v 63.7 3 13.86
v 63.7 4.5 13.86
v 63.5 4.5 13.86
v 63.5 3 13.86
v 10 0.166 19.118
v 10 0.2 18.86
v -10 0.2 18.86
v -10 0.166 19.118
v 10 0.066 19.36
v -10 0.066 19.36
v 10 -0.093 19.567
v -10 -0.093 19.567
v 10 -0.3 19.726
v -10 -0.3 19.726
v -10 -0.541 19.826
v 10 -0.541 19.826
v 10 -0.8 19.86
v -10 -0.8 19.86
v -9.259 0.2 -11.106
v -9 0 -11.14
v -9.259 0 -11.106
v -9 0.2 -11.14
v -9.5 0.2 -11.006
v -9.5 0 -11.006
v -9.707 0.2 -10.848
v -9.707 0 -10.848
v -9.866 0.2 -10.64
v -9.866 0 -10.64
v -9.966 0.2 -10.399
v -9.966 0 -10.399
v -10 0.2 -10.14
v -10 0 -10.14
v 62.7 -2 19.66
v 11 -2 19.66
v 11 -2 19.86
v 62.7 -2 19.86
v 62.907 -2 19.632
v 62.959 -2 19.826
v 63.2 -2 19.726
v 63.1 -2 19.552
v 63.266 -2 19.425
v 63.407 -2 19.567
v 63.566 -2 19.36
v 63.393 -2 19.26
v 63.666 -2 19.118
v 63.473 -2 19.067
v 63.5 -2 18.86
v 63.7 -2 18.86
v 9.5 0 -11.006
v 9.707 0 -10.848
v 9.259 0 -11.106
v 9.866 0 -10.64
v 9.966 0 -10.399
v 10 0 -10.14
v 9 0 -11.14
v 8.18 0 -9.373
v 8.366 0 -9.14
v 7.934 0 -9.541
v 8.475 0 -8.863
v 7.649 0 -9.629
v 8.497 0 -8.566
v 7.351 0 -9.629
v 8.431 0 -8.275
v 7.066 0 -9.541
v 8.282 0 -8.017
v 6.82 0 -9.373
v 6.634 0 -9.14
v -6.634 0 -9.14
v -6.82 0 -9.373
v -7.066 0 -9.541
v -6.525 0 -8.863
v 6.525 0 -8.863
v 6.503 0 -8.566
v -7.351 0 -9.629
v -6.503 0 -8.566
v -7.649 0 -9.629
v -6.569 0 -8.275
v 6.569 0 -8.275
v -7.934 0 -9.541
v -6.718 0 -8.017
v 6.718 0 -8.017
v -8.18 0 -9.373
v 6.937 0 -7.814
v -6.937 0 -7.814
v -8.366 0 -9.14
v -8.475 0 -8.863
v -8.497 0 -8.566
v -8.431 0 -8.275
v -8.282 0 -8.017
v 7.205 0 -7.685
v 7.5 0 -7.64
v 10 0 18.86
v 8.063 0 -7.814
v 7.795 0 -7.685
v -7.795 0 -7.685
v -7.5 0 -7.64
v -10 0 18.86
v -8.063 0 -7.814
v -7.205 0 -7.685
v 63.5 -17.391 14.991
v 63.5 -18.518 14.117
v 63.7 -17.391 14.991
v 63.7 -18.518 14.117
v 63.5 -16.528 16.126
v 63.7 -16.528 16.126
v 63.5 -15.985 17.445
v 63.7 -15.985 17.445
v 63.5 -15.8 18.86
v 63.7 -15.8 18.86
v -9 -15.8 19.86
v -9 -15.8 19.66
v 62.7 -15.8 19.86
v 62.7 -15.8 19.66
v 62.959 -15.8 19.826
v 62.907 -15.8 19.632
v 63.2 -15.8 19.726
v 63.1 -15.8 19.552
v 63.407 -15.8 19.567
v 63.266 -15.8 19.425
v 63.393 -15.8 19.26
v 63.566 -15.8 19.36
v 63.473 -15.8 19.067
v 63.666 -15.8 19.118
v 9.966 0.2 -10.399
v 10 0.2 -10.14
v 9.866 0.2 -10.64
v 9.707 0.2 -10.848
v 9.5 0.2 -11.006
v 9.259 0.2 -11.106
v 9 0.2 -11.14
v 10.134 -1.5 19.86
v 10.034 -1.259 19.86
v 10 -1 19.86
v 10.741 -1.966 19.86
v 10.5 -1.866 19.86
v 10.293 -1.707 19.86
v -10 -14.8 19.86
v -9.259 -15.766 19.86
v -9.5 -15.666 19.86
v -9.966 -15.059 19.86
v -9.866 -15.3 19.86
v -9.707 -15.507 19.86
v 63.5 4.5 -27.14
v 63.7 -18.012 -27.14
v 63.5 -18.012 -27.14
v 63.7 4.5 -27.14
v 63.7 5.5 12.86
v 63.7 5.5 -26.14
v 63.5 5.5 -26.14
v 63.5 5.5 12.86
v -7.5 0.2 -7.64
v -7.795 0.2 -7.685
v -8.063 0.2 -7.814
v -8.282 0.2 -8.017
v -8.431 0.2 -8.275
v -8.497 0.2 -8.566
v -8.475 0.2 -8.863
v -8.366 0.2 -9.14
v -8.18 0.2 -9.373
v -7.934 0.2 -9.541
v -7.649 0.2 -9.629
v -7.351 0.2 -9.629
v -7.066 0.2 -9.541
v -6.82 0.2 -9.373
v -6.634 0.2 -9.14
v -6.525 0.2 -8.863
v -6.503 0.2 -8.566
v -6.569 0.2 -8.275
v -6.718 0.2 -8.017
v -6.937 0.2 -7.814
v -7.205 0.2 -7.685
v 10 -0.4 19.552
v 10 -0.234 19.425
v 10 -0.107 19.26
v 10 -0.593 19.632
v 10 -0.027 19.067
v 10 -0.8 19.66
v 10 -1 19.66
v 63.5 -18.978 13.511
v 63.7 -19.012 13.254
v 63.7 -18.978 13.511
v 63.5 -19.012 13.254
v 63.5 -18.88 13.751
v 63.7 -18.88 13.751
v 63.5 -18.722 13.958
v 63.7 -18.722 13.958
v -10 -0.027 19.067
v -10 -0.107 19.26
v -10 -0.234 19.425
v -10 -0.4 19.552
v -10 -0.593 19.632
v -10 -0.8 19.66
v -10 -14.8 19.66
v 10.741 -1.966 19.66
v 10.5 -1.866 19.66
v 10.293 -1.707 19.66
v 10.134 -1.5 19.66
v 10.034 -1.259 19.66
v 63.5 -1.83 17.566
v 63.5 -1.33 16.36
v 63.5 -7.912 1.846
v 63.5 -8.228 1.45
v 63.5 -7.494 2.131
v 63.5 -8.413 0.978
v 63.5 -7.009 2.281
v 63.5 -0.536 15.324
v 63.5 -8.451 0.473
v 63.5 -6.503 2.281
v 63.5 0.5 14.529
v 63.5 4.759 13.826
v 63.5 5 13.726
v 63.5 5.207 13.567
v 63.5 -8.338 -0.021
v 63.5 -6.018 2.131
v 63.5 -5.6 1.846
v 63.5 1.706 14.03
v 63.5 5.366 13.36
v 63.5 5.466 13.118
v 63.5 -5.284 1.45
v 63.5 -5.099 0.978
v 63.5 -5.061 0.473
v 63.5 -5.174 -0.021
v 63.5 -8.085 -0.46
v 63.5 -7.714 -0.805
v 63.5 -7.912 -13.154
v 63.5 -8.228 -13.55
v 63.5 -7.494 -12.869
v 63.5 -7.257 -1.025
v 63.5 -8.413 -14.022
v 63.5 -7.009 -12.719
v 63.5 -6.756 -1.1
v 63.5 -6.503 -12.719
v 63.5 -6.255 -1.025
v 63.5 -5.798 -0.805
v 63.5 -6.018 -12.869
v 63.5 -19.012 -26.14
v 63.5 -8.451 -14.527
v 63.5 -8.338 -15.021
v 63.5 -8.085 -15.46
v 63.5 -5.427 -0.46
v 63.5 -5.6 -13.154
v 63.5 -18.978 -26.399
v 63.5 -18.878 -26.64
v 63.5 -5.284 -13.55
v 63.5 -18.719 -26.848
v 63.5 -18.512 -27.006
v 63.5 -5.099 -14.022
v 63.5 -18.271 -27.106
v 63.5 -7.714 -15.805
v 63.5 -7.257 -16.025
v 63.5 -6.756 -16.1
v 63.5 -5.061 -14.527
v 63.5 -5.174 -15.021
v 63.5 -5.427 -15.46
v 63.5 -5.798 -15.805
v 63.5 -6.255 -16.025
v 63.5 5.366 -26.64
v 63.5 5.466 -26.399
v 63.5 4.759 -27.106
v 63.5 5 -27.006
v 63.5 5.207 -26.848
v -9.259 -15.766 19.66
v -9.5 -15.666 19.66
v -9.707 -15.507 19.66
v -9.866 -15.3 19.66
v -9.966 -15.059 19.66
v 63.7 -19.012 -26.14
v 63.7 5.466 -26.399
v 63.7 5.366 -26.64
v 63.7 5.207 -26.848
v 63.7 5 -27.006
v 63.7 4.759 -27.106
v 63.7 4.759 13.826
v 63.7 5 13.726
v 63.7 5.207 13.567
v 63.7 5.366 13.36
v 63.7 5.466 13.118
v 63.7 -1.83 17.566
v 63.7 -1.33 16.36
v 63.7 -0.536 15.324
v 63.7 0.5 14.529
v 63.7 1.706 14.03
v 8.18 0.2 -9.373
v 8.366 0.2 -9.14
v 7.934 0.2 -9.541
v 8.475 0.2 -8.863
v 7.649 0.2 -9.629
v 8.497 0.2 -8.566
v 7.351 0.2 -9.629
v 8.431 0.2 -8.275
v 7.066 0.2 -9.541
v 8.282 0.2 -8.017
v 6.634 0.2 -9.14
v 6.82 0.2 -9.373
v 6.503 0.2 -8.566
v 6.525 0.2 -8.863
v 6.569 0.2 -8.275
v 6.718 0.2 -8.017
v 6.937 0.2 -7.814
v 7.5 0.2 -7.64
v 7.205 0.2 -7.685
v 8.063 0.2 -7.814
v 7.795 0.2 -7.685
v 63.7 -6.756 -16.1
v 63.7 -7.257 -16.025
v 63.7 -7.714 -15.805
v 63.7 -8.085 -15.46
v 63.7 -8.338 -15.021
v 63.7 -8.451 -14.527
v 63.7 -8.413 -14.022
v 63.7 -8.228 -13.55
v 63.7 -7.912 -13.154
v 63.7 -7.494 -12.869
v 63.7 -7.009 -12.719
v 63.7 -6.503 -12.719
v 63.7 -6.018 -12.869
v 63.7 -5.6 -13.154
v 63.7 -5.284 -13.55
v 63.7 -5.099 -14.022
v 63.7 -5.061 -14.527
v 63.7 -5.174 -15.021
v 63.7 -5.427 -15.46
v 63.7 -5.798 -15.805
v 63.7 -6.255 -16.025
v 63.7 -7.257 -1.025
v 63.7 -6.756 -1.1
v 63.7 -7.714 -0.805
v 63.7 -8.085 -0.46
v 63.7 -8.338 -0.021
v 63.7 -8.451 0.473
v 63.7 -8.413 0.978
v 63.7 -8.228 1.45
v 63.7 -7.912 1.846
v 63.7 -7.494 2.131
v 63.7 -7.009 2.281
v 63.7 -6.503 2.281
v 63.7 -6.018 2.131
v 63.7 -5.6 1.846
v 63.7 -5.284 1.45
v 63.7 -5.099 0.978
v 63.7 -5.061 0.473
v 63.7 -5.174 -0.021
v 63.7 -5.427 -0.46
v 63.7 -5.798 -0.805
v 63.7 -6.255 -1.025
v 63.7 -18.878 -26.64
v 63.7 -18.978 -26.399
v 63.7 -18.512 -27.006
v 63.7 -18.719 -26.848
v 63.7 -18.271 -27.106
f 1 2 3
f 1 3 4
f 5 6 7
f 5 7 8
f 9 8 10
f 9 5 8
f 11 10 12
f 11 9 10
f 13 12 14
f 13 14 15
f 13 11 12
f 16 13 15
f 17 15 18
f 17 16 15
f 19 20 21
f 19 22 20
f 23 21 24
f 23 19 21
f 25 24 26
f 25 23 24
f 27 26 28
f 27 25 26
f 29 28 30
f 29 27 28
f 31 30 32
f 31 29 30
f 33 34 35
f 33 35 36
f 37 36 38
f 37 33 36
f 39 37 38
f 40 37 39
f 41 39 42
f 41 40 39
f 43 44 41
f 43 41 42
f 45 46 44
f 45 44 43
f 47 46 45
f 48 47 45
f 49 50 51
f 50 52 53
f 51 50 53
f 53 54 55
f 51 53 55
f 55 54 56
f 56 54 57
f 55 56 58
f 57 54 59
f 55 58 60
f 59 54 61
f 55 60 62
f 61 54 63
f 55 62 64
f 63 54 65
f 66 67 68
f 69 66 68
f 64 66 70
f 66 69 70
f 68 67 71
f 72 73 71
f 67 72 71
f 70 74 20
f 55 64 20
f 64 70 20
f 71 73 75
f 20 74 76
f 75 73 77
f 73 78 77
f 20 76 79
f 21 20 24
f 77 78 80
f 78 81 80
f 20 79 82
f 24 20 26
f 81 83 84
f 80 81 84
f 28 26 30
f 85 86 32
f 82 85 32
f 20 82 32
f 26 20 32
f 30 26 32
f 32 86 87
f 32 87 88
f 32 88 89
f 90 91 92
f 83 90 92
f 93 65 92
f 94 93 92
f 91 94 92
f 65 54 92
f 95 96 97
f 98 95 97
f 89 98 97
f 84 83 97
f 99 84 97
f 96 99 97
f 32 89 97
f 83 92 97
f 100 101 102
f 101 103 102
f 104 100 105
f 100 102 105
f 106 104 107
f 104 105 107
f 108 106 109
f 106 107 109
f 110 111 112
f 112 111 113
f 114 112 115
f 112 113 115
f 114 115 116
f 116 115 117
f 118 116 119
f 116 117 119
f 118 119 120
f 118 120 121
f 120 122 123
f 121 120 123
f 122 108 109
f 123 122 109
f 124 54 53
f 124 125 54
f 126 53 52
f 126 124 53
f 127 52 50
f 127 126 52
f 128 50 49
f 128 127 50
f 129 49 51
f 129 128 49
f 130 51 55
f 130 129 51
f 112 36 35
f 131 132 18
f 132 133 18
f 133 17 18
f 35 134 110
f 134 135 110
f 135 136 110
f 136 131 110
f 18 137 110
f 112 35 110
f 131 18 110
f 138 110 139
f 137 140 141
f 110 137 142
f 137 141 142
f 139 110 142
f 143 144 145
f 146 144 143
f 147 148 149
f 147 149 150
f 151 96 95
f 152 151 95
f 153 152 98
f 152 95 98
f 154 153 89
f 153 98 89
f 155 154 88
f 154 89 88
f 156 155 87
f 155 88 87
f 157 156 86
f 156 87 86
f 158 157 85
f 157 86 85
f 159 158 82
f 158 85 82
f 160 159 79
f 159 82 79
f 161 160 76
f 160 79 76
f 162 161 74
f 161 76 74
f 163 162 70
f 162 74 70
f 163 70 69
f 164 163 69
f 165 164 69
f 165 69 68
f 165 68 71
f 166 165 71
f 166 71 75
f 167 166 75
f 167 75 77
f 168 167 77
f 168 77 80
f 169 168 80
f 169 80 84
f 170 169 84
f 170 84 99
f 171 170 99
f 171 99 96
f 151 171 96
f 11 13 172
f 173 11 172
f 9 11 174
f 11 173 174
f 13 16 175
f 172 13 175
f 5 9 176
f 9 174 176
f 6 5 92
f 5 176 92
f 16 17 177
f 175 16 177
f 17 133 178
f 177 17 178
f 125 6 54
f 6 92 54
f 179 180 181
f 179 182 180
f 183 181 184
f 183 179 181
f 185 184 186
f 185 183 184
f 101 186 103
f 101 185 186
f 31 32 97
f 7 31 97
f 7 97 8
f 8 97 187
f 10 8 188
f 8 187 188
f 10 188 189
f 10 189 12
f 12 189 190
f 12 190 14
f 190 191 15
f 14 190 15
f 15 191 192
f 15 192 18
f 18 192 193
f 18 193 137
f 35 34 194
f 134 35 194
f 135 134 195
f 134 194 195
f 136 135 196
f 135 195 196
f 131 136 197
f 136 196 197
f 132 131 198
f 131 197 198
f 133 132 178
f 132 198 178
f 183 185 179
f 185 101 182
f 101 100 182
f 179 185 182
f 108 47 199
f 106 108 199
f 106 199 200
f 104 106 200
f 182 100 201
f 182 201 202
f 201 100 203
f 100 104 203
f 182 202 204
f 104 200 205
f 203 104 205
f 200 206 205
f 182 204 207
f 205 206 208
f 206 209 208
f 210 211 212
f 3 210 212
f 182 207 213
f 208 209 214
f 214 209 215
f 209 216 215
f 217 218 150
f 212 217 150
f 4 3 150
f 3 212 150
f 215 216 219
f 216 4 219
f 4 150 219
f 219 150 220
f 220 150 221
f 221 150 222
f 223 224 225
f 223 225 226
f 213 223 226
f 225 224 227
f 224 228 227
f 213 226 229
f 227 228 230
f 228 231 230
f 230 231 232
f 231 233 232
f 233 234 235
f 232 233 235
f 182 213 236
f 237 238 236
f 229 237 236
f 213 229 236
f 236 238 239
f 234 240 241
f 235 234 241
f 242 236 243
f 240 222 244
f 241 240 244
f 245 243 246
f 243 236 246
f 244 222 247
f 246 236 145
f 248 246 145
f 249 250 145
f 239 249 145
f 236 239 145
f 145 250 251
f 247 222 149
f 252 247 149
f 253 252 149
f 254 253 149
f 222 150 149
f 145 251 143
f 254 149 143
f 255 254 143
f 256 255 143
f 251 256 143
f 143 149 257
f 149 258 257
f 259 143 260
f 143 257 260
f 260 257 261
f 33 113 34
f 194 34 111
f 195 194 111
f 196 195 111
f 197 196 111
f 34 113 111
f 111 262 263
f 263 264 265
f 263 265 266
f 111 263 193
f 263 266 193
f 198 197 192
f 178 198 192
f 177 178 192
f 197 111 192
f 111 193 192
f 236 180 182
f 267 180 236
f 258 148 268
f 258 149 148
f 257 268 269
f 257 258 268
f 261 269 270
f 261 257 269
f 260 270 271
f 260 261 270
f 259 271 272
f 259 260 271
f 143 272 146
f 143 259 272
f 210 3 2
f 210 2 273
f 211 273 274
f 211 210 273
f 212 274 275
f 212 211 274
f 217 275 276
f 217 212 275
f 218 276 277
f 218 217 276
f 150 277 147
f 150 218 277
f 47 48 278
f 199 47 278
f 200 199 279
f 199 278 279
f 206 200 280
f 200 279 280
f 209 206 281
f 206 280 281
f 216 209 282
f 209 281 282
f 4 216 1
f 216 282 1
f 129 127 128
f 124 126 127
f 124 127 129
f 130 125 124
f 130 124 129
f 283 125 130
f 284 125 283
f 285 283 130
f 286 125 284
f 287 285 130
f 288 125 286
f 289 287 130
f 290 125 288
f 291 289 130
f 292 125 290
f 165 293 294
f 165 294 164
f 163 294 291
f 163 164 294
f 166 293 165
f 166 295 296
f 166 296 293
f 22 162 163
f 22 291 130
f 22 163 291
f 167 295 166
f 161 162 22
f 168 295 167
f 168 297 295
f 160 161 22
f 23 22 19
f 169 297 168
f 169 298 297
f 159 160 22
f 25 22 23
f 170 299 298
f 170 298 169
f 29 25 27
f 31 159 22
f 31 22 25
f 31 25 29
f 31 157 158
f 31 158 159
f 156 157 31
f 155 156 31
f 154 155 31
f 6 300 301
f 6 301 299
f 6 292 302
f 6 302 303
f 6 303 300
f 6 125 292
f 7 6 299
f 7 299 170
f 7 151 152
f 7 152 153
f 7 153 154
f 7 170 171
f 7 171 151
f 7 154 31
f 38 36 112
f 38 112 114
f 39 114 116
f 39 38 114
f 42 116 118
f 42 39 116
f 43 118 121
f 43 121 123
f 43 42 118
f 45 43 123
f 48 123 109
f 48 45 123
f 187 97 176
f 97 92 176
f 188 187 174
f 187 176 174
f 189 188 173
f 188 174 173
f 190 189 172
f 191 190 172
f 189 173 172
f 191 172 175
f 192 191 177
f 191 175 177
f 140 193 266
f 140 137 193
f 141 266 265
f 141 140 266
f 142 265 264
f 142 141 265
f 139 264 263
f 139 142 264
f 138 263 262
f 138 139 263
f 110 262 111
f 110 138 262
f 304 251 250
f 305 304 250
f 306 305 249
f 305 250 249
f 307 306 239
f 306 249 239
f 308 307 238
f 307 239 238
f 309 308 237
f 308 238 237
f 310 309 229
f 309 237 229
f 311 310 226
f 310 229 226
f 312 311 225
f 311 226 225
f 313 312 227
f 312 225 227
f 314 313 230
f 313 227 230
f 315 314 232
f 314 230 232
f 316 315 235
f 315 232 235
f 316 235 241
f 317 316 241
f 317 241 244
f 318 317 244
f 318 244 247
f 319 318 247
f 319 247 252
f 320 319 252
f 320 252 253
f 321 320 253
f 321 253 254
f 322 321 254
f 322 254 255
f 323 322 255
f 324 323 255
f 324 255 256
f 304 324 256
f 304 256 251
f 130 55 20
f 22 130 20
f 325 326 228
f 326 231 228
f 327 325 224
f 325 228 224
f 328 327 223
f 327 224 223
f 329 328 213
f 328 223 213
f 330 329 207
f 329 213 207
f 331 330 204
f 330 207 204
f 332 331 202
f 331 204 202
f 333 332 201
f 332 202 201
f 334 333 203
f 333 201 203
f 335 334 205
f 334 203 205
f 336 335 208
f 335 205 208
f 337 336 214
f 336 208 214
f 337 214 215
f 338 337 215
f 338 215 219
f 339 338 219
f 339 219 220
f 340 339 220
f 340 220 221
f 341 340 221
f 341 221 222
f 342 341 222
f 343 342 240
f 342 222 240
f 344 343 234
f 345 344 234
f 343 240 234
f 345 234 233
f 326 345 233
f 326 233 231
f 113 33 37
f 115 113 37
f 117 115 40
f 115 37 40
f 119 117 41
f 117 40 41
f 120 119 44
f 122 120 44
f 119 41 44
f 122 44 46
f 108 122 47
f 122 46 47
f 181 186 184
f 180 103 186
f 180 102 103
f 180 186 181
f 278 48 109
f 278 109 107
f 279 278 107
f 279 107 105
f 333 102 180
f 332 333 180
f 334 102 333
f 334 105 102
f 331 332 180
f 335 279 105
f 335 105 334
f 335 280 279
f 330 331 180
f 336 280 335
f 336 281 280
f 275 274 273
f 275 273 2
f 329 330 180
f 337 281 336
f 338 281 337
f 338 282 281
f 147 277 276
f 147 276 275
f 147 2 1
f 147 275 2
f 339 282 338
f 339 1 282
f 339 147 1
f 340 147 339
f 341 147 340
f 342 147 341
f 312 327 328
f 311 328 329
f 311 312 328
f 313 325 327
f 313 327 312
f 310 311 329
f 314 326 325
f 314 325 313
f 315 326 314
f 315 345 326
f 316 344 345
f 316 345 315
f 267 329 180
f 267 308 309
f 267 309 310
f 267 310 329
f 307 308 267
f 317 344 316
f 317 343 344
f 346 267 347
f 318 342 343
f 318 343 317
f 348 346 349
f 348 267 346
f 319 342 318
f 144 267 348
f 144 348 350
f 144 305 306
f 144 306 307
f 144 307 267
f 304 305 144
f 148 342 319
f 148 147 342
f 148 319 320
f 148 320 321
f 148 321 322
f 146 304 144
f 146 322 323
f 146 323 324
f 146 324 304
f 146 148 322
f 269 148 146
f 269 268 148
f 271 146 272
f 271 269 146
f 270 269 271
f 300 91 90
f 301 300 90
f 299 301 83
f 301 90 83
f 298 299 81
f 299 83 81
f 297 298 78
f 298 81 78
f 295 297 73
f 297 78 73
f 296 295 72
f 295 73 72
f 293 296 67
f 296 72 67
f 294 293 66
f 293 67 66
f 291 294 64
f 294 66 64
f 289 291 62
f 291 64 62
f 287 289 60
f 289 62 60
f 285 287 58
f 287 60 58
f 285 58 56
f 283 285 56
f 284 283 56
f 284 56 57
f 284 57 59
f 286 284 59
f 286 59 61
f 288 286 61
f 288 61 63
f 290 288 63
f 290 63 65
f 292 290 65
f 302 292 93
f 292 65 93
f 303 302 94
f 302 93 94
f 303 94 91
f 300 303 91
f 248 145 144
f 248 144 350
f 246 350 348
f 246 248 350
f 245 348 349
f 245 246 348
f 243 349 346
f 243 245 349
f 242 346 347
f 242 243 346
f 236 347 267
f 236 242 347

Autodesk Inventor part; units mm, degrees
ref_plane "YZ Plane" through (0, 0, 0) normal (1, 0, 0) x (0, 1, 0)
ref_plane "XZ Plane" through (0, 0, 0) normal (0, 1, 0) x (-1, 0, 0)
ref_plane "XY Plane" through (0, 0, 0) normal (0, 0, 1) x (1, 0, 0)
sketch "Sketch1" plane through (0, 0, 0) normal (0, 1, 0) x (-1, 0, 0)
  line L0 (-10, -11.1404) -> (10, -11.1404)
  line L1 (10, -11.1404) -> (10, 18.8596)
  line L2 (10, 18.8596) -> (-10, 18.8596)
  line L3 (-10, 18.8596) -> (-10, -11.1404)
  point P0 (0, 0)
  dimension "d0" = 20
  dimension "d1" = 10
  dimension "d2" = 30
extrude "Extrusion1" add sketch "Sketch1" along normal blind 0.2
sketch "Sketch2" plane through (10, 0, 18.8596) normal (1, 0, 0) x (0, 0, -1)
  line L0 (30, 0.2) -> (0, 0.2) projected
  arc A0 (0, 0.2) -> (-1, -0.8) centre (0, -0.8) ccw
  line L1 (0, -0.8) -> (-1, -0.8) construction
  line L2 (0, -0.8) -> (0, 0.2) construction
  arc A1 (0, 0) -> (-0.8, -0.8) centre (0, -0.8) ccw
  line L3 (0, 0) -> (30, 0) projected
  line L4 (-0.8, -0.8) -> (-0.8, -15.8)
  line L5 (-0.8, -15.8) -> (-1, -15.8)
  line L6 (-1, -15.8) -> (-1, -0.8)
  line L7 (0, 0) -> (0, 0.2) projected
  point P0 (18.8596, 0)
  dimension "d5" = 90
  dimension "d6" = 1
  dimension "d7" = 0.2
  dimension "d8" = 0.2
  dimension "d9" = 15
extrude "Extrusion2" add sketch "Sketch2" against normal up to surface (20 mm away)
sketch "Sketch3" plane through (10, -15.8, 19.8596) normal (1, 0, 0) x (0, 0, -1)
  arc A0 (1, 16) -> (0, 15) centre (1, 15) ccw projected
  arc A1 (1, 15.8) -> (0.2, 15) centre (1, 15) ccw projected
  line L0 (0, 13.8) -> (0.2, 13.8)
  line L1 (0, 15) -> (0, 0) projected
  line L2 (0.2, 0) -> (0.2, 15) projected
  line L3 (0, 0) -> (0.2, 0) projected
  point P0 (19.8596, 15.8)
  dimension "d19" = 1.2
extrude "Extrusion3" add sketch "Sketch3" along normal blind 52.7
sketch "Sketch4" plane through (10, -2, 19.8596) normal (0, 1, 0) x (1, 0, 0)
  line L0 (52.7, 0.2) -> (52.7, 0) projected
  arc A0 (52.7, 0) -> (53.7, 1) centre (52.7, 1) ccw
  line L1 (52.7, 1) -> (53.7, 1) construction
  line L2 (52.7, 1) -> (52.7, 0) construction
  arc A1 (52.7, 0.2) -> (53.5, 1) centre (52.7, 1) ccw
  line L3 (53.5, 1) -> (53.5, 47)
  line L4 (53.5, 47) -> (53.7, 47)
  line L5 (53.7, 47) -> (53.7, 1)
  point P0 (-10, 19.8596)
  dimension "d14" = 90
  dimension "d15" = 1
  dimension "d16" = 46
  dimension "d28" = 0.2
extrude "Extrusion4" add sketch "Sketch4" against normal up to surface (13.8 mm away)
sketch "Sketch5" plane through (63.7, -2, 18.8596) normal (1, 0, 0) x (0, 0, -1)
  line L0 (46, 0) -> (0, 0) projected
  line L1 (0, 0) -> (0, 0)
  line L2 (46, 0) -> (46, 7.5)
  line L3 (46, 7.5) -> (5, 7.5)
  line L4 (5, 7.5) -> (5, 5)
  arc A0 (0, 0) -> (5, 5) centre (0, 5) ccw
  point P0 (18.8596, 2)
  point P1 (5, 6.25)
  point P2 (30, 0)
  dimension "d20" = 7.5
  dimension "d21" = 5
  dimension "d22" = 5
extrude "Extrusion5" add sketch "Sketch5" against normal up to surface (0.2 mm away)
sketch "Sketch6" plane through (63.7, -15.8, 18.8596) normal (1, 0, 0) x (0, 0, -1)
  line L0 (46, 0) -> (46, 21.3) projected
  line L1 (46, 0) -> (5, 0)
  line L2 (5, -3.2119) -> (46, -3.2119)
  line L3 (46, -3.2119) -> (46, 0)
  line L4 (5, 21.3) -> (5, 18.8) projected
  line L5 (46, 0) -> (0, 0) projected
  arc A0 (5, -3.2119) -> (0, 0) centre (0, -5.4977) ccw
  line L6 (-1, 0) -> (0, 0) projected
  line L7 (0, 0) -> (5, 0)
  point P0 (18.8596, 15.8)
  point P1 (46.1737, 13.8)
extrude "Extrusion6" add sketch "Sketch6" against normal up to surface (0.2 mm away)
fillet "Fillet1" radius 1 8 edges at (63.6, 5.5, 13.8596) (63.6, 5.5, -27.1404) (63.6, -19.0119, -27.1404) (63.6, -19.0119, 13.8596) (10, 0.1, -11.1404) (-10, 0.1, -11.1404) (-10, -15.8, 19.7596) (10, -2, 19.7596)
sketch "Sketch7" plane through (0, 0.2, 0) normal (0, 1, 0) x (1, 0, 0)
  line L0 (-10, 10.1404) -> (-10, -18.8596) projected
  line L1 (9, 11.1404) -> (-9, 11.1404) projected
  line L2 (10, -18.8596) -> (10, 10.1404) projected
  point P0 (0, 0)
  point P1 (7.5, 8.6404)
  point P2 (-7.5, 8.6404)
  dimension "d29" = 2.5
  dimension "d30" = 2.5
  dimension "d31" = 2.5
hole "Hole1" at (7.5, 0.2, -8.6404) at (-7.5, 0.2, -8.6404) direction (0, -1, 0) diameter 2 depth 7.9 tip angle 118
sketch "Sketch8" plane through (63.7, -15.8, 18.8596) normal (1, 0, 0) x (0, 0, -1)
  line L0 (45, 21.3) -> (6, 21.3) projected
  line L1 (5.6057, -3.2119) -> (45, -3.2119) projected
  line L2 (46, -2.2119) -> (46, 20.3) projected
  point P0 (18.8596, 15.8)
  point P1 (18.26, 9.044)
  point P2 (33.26, 9.044)
  dimension "d39" = 24.5119
  dimension "d40" = 12.256
  dimension "d41" = 15
  dimension "d42" = 12.74
hole "Hole2" at (63.7, -6.756, 0.5996) at (63.7, -6.756, -14.4004) direction (-1, 0, 0) diameter 3.4 depth 7.9 tip angle 118 clearance for "Flat Head Machine Screw" size "M3" standard "Ansi Metric M Profile"
equation "\"d1\" = 0.5 * d0"
equation "\"d8\" = d7"
equation "\"d30\" = d29"
equation "\"d31\" = d29"
equation "\"d40\" = 0.5 * d39"
properties part number "Flex V1" material "Copper"
